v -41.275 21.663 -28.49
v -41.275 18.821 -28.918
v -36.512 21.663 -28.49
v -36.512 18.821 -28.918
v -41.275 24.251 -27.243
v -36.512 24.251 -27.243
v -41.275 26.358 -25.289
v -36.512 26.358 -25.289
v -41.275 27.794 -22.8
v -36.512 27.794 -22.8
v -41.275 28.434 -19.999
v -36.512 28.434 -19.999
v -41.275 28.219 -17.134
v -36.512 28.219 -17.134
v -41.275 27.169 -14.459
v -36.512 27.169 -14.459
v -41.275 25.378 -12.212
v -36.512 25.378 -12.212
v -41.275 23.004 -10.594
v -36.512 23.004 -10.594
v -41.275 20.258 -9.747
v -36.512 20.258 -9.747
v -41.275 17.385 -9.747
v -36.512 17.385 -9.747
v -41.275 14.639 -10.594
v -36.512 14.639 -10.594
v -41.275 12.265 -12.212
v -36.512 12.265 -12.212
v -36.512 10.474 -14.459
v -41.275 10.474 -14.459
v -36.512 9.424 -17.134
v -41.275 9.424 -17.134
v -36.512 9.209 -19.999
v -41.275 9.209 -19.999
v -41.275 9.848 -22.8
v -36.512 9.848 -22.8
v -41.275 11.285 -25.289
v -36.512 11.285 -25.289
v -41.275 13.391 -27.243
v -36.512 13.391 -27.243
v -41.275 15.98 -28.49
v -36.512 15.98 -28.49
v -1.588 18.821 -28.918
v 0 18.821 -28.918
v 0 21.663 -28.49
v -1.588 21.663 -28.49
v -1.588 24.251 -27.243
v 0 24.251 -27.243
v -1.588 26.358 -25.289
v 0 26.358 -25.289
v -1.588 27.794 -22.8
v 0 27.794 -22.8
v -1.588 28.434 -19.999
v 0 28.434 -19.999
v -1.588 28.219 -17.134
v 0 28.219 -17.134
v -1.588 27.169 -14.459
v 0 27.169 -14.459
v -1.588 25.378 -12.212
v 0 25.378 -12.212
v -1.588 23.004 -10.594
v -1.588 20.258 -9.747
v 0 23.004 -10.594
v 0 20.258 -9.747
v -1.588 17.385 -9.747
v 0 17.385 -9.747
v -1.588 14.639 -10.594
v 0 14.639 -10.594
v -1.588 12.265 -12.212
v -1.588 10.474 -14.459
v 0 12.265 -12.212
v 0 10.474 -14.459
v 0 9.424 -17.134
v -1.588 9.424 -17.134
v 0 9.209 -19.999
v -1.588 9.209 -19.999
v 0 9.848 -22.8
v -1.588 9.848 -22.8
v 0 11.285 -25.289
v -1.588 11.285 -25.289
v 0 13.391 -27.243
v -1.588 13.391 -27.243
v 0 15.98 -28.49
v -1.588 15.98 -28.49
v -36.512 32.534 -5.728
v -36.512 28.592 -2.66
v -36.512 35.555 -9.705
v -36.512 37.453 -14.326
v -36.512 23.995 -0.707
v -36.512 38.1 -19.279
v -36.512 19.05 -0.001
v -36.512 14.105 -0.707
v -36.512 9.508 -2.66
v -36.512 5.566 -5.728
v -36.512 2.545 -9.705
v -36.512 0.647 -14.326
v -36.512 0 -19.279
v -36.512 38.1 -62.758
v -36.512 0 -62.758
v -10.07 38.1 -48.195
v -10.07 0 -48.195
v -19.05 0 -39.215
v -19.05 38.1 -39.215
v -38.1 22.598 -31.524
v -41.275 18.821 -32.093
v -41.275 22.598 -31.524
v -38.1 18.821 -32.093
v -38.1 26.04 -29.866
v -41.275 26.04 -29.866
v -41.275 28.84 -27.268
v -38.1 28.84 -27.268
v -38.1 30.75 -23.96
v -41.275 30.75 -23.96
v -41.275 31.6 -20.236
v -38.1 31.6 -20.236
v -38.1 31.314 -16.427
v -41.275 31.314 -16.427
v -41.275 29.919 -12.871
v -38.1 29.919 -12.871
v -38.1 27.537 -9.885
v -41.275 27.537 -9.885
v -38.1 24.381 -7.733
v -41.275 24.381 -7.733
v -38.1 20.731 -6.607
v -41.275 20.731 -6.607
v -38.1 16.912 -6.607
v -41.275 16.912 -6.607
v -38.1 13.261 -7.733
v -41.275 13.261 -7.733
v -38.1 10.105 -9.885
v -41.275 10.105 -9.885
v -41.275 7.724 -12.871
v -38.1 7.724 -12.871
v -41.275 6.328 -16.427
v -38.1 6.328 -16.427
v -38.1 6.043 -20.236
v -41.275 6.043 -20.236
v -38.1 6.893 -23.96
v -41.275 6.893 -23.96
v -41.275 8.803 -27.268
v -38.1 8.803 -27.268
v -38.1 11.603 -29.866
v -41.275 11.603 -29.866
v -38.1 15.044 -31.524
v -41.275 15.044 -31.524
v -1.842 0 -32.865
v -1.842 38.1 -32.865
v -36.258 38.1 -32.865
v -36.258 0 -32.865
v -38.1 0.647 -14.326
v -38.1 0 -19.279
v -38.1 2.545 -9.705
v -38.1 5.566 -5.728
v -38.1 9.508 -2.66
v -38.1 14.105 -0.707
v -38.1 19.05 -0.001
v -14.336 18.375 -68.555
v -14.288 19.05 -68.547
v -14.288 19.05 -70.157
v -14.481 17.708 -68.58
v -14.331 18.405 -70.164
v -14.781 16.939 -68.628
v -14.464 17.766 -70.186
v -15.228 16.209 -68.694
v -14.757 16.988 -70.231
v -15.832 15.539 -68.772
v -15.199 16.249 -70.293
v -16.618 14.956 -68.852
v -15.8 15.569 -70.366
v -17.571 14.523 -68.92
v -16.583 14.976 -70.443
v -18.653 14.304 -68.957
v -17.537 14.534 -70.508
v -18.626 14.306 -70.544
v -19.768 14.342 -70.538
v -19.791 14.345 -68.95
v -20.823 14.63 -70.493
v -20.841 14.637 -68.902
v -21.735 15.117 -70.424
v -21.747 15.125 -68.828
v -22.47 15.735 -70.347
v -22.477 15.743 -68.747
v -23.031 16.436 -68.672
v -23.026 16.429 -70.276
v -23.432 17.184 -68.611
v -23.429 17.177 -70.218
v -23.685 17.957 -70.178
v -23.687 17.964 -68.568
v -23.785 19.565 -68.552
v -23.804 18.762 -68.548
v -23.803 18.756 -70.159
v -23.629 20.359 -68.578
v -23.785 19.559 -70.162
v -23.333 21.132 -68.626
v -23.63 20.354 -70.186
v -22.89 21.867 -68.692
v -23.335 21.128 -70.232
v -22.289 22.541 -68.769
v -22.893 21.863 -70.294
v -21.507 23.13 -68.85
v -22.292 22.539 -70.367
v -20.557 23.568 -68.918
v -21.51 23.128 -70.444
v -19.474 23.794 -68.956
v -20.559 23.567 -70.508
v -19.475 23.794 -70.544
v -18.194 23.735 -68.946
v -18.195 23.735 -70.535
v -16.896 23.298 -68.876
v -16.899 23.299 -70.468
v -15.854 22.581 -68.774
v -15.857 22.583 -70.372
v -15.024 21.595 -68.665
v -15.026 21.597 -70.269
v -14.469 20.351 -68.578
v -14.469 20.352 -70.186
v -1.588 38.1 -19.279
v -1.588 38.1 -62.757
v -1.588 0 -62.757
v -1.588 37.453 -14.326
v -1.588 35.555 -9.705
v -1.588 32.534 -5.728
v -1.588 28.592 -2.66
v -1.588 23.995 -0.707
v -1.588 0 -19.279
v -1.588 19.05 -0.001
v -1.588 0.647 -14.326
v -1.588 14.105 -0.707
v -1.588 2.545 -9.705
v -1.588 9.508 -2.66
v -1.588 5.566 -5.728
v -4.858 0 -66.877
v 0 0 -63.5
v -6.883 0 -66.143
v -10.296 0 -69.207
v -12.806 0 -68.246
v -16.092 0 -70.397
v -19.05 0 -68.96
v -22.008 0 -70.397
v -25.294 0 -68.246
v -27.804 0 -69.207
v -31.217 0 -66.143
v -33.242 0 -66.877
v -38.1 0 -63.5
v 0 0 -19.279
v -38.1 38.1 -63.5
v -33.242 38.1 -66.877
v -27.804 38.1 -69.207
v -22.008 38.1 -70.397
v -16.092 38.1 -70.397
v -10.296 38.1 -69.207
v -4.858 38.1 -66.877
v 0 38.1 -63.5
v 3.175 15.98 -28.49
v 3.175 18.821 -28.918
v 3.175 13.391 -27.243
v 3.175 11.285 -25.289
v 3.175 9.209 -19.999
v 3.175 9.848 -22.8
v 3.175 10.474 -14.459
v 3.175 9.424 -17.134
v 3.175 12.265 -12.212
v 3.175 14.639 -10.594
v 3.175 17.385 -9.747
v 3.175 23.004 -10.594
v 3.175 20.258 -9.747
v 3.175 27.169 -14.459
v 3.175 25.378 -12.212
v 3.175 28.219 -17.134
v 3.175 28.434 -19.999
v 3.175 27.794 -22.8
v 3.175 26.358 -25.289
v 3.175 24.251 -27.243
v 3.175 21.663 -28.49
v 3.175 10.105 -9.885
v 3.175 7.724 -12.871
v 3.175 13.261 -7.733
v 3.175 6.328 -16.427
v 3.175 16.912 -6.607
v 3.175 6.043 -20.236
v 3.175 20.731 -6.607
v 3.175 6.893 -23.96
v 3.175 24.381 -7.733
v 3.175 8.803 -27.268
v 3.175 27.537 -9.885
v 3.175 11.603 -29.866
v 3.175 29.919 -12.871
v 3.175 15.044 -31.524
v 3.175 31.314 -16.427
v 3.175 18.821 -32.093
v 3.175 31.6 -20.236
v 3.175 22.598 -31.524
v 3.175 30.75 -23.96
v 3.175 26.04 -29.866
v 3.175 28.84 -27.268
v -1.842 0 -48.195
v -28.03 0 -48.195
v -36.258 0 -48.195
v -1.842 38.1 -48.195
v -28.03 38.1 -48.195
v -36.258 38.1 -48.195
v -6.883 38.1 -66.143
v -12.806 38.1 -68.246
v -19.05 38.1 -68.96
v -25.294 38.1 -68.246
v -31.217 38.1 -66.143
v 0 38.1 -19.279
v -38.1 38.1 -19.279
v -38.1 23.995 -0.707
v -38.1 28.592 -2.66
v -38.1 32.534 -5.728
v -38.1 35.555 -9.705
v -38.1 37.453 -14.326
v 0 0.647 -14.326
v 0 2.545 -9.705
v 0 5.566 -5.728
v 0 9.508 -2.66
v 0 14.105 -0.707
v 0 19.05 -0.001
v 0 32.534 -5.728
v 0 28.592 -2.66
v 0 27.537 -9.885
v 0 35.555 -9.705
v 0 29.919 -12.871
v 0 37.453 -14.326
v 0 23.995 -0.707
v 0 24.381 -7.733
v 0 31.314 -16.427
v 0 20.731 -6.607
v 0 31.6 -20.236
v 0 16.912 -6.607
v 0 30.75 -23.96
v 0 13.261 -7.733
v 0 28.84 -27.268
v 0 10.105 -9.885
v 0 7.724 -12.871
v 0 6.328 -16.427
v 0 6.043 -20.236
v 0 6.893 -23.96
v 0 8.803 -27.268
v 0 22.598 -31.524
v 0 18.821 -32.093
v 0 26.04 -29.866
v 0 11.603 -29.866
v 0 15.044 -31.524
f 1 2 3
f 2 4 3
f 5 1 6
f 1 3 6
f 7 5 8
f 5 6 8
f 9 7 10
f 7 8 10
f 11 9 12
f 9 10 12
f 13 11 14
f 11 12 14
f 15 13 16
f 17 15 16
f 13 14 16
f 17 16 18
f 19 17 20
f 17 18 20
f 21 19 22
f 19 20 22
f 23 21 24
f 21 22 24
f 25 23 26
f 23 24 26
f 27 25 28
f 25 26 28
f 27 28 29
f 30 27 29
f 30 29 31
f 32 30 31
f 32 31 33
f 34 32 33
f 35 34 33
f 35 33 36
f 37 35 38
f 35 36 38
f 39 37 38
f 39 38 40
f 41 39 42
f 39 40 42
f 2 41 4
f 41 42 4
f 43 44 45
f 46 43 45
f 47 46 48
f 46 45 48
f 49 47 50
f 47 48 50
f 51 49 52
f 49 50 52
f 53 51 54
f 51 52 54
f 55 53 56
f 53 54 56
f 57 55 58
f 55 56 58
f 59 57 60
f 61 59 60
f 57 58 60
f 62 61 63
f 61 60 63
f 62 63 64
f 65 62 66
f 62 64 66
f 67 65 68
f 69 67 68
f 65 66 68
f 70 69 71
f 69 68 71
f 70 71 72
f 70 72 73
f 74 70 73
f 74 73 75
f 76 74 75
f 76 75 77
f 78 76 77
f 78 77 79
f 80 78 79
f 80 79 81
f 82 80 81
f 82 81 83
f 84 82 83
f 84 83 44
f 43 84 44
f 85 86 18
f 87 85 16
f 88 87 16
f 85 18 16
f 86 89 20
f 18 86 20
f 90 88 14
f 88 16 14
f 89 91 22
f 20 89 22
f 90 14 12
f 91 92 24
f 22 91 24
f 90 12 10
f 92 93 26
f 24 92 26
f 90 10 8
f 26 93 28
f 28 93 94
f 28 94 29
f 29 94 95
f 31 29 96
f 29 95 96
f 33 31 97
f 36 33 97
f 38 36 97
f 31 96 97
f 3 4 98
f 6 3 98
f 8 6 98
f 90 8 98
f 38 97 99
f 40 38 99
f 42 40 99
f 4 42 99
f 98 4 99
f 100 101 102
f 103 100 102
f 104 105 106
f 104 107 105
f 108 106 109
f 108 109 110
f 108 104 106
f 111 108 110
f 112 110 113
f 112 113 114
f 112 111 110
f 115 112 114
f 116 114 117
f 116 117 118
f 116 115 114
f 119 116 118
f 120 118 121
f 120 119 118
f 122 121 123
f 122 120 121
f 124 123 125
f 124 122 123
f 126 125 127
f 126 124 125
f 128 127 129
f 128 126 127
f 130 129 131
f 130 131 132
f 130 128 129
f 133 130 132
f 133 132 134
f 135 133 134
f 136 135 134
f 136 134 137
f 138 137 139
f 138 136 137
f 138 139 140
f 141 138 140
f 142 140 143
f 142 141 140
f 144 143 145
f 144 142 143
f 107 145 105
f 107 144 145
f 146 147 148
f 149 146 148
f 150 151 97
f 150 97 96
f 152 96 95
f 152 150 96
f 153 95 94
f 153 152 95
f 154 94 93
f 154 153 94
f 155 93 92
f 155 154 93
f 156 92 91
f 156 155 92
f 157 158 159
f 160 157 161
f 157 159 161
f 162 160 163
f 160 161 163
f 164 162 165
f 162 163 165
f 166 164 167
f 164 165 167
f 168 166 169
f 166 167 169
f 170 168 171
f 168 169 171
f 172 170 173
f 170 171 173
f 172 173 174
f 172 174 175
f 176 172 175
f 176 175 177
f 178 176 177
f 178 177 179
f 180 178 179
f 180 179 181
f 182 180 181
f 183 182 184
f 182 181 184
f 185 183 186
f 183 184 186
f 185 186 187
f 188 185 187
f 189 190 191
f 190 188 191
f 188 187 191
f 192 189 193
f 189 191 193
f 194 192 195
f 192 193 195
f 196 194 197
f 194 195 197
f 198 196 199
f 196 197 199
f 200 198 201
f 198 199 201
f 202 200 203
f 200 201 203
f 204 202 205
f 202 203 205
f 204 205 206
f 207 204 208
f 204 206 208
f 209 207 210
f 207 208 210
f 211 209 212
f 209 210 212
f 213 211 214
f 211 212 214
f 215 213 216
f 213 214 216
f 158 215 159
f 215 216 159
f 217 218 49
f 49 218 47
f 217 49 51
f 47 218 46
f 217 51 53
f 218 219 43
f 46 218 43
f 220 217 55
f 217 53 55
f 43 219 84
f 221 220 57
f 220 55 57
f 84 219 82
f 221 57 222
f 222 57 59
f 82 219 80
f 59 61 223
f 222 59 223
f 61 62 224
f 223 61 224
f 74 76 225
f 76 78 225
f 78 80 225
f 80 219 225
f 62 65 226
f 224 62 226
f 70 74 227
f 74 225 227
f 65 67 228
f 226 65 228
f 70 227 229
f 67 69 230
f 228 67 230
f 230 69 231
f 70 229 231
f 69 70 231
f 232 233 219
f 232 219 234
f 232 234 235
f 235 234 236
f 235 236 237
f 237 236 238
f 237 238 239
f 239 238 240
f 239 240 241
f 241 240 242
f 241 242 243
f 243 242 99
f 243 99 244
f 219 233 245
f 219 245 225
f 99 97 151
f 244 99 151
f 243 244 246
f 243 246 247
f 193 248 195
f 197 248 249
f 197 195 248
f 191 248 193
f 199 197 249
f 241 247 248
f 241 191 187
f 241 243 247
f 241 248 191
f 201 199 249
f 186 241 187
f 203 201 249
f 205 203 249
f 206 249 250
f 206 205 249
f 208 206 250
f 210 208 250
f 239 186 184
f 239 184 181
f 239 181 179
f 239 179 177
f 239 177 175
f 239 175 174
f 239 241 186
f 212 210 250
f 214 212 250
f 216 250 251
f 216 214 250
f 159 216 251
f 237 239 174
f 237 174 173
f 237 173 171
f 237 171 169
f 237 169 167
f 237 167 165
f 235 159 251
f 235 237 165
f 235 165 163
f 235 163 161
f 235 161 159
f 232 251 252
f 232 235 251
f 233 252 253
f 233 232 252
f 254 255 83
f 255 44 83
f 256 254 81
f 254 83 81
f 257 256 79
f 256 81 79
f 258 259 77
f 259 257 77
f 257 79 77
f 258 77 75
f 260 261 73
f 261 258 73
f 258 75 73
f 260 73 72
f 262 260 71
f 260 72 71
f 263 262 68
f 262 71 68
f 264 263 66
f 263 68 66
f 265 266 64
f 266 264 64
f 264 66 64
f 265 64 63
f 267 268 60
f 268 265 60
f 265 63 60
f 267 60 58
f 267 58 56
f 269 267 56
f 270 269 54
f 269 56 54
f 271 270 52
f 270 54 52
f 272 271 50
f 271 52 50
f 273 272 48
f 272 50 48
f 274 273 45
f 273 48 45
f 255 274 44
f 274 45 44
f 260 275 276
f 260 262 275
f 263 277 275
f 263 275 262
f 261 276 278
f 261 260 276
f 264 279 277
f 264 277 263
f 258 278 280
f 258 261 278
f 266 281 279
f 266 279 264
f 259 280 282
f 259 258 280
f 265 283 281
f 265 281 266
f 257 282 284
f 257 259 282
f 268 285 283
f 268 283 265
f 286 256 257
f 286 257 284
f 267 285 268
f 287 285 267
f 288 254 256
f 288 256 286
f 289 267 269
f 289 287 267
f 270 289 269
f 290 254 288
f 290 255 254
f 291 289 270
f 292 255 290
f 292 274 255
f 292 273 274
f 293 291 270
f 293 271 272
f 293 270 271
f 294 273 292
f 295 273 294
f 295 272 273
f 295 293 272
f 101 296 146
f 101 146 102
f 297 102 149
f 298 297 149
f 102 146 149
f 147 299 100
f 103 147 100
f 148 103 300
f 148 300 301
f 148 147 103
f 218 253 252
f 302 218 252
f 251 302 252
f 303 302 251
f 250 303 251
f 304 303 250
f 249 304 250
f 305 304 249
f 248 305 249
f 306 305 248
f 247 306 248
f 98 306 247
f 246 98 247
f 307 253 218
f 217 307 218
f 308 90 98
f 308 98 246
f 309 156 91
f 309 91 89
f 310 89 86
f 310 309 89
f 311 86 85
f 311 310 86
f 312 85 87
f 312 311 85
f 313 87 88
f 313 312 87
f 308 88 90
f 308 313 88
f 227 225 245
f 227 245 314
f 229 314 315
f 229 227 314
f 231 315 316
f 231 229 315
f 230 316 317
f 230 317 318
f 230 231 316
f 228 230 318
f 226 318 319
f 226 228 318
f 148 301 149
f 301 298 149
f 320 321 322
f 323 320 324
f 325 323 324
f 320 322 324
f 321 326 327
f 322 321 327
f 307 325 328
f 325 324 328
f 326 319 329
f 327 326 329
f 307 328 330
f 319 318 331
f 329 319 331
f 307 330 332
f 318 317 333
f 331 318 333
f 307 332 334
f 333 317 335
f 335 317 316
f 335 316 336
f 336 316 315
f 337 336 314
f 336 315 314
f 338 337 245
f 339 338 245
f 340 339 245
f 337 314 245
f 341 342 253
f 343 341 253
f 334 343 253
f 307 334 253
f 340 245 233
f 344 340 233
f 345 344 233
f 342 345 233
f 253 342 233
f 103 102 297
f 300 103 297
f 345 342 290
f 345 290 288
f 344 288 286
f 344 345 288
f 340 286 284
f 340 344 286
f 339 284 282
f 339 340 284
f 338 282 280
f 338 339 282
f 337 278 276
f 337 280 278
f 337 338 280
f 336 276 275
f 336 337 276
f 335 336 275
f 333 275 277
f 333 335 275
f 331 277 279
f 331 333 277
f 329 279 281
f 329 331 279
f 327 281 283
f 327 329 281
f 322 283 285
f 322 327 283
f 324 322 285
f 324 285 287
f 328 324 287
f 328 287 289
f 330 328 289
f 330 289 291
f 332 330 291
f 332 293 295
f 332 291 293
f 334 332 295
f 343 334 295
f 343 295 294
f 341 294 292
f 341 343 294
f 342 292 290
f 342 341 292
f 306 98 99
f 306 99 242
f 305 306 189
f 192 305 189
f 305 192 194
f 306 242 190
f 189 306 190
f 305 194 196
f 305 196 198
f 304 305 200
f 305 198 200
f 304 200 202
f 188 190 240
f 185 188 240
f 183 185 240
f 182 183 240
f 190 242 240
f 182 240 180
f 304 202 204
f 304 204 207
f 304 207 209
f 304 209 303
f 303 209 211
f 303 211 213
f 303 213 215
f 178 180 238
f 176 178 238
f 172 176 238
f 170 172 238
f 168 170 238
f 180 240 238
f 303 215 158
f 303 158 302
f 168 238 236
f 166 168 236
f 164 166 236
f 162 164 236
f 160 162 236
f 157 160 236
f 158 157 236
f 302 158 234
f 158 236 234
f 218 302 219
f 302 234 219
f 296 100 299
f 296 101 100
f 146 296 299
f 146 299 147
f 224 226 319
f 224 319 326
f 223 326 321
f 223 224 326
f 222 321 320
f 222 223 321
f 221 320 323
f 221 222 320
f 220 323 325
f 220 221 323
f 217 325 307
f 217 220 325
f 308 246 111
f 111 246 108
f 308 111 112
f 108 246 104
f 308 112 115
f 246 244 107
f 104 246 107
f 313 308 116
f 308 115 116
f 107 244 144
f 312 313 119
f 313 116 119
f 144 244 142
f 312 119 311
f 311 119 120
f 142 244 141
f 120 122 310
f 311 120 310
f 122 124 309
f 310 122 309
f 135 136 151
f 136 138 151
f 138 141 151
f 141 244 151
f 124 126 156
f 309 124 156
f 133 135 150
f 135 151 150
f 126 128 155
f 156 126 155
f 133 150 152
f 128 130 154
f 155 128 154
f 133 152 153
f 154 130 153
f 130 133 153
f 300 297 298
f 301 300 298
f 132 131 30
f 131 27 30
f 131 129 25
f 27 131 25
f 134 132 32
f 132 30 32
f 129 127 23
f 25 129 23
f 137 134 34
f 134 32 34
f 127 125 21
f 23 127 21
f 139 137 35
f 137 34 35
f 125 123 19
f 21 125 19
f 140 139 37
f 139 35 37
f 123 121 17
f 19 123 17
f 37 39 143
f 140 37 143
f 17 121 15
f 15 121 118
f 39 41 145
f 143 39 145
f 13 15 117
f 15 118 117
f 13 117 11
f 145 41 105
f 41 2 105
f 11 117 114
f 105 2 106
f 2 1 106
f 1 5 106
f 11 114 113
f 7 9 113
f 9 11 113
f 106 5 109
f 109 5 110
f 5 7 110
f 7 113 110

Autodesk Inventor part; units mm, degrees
ref_plane "YZ Plane" through (0, 0, 0) normal (1, 0, 0) x (0, 1, 0)
ref_plane "XZ Plane" through (0, 0, 0) normal (0, 1, 0) x (-1, 0, 0)
ref_plane "XY Plane" through (0, 0, 0) normal (0, 0, 1) x (1, 0, 0)
sketch "Sketch1" plane through (0, 0, 0) normal (0, 1, 0) x (-1, 0, 0)
  line L0 (0, 0) -> (0, -63.5)
  arc A0 (0, -63.5) -> (38.1, -63.5) centre (19.05, -41.275) ccw
  line L1 (38.1, -63.5) -> (38.1, 0)
  line L2 (36.5125, 0) -> (36.5125, -62.7575)
  arc A1 (1.5875, -62.7574) -> (36.5125, -62.7575) centre (19.05, -41.275) ccw
  line L3 (1.5875, -62.7574) -> (1.5875, 0)
  line L4 (38.1, 0) -> (36.5125, 0)
  line L5 (1.5875, 0) -> (0, 0)
  circle A2 centre (19.05, -48.1951) radius 6.35 construction
  line L6 (12.7, -48.1951) -> (1.8415, -48.1951) construction
  line L7 (25.4, -48.1951) -> (36.2585, -48.1951) construction
  line L8 (19.05, -54.5451) -> (19.05, -68.9596) construction
  line L9 (12.7, -48.1951) -> (25.4, -48.1951) construction
  line L10 (10.0697, -48.1951) -> (19.05, -39.2148)
  line L11 (19.05, -39.2148) -> (28.0303, -48.1951)
  line L12 (28.0303, -48.1951) -> (36.2585, -48.1951)
  line L13 (10.0697, -48.1951) -> (1.8415, -48.1951)
  line L14 (1.8415, -32.8648) -> (36.2585, -32.8648)
  line L15 (1.8415, -48.1951) -> (1.8415, -32.8648)
  line L16 (36.2585, -48.1951) -> (36.2585, -32.8648)
  dimension "d0" = 63.5
  dimension "d1" = 38.1
  dimension "d2" = 38.1
  dimension "d3" = 1.5875
  dimension "d19" = 12.7
  dimension "d20" = 22.225
  dimension "d21" = 6.35
  dimension "d24" = 0.254
  dimension "d25" = 14.4145
extrude "Extrusion1" add sketch "Sketch1" along normal blind 38.1 contours L5 L3 A1 L2 L4 L1 A0 L0
ref_plane "Work Plane1" through (-19.05, 0, -70.5471) normal (0, 0, 1) x (1, 0, 0)
fillet "Fillet1" radius 19.2786 4 edges at (-0.7937, 38.1, 0) (-37.3062, 38.1, 0) (-37.3062, 0, 0) (-0.7937, 0, 0)
sketch "Sketch2" plane through (0, 0, -63.5) normal (1, 0, 0) x (0, 0, -1)
  arc A0 (-44.2214, 38.1) -> (-63.5, 18.8214) centre (-44.2214, 18.8214) ccw projected
  line L0 (-44.2268, 0) -> (0, 0) projected
  line L1 (0, 0) -> (0, 38.1) projected
  line L2 (-44.2214, 38.1) -> (0, 38.1) projected
  circle A1 centre (-44.2214, 18.8214) radius 9.6393
  circle A2 centre (-44.2214, 18.8214) radius 12.8143
  arc A3 (-63.5, 18.8214) -> (-44.2268, 0) centre (-44.2268, 19.2786) ccw projected
  point P0 (-63.5, 0)
  dimension "d7" = 19.2786
  dimension "d8" = 3.175
extrude "Extrusion2" cut sketch "Sketch2" against normal through all contours A1
extrude "Extrusion3" add sketch "Sketch2" along normal blind 3.175 contours A2
extrude "Extrusion4" add sketch "Sketch2" against normal blind 3.175 from surface at -38.1 contours A2
sketch "Sketch3" plane through (-19.05, 0, -70.5471) normal (0, 0, 1) x (1, 0, 0)
  line L0 (19.05, 0) -> (-19.05, 0) projected
  line L1 (-19.05, 0) -> (-19.05, 38.1) projected
  line L2 (19.05, 38.1) -> (-19.05, 38.1) projected
  line L3 (19.05, 0) -> (19.05, 38.1) projected
  line L4 (19.05, 38.1) -> (-19.05, 0) construction
  circle A0 centre (0, 19.05) radius 4.7625
  point P0 (19.05, 0)
  dimension "d6" = 19.2786
  dimension "d15" = 9.525
extrude "screw hole" cut sketch "Sketch3" along normal through all contours A0
extrude "Extrusion6" add sketch "Sketch1" along normal up to surface (38.1 mm away) contours L13 L15 L14 L16 L12 L11 L10
properties part number "Clamp Body"
